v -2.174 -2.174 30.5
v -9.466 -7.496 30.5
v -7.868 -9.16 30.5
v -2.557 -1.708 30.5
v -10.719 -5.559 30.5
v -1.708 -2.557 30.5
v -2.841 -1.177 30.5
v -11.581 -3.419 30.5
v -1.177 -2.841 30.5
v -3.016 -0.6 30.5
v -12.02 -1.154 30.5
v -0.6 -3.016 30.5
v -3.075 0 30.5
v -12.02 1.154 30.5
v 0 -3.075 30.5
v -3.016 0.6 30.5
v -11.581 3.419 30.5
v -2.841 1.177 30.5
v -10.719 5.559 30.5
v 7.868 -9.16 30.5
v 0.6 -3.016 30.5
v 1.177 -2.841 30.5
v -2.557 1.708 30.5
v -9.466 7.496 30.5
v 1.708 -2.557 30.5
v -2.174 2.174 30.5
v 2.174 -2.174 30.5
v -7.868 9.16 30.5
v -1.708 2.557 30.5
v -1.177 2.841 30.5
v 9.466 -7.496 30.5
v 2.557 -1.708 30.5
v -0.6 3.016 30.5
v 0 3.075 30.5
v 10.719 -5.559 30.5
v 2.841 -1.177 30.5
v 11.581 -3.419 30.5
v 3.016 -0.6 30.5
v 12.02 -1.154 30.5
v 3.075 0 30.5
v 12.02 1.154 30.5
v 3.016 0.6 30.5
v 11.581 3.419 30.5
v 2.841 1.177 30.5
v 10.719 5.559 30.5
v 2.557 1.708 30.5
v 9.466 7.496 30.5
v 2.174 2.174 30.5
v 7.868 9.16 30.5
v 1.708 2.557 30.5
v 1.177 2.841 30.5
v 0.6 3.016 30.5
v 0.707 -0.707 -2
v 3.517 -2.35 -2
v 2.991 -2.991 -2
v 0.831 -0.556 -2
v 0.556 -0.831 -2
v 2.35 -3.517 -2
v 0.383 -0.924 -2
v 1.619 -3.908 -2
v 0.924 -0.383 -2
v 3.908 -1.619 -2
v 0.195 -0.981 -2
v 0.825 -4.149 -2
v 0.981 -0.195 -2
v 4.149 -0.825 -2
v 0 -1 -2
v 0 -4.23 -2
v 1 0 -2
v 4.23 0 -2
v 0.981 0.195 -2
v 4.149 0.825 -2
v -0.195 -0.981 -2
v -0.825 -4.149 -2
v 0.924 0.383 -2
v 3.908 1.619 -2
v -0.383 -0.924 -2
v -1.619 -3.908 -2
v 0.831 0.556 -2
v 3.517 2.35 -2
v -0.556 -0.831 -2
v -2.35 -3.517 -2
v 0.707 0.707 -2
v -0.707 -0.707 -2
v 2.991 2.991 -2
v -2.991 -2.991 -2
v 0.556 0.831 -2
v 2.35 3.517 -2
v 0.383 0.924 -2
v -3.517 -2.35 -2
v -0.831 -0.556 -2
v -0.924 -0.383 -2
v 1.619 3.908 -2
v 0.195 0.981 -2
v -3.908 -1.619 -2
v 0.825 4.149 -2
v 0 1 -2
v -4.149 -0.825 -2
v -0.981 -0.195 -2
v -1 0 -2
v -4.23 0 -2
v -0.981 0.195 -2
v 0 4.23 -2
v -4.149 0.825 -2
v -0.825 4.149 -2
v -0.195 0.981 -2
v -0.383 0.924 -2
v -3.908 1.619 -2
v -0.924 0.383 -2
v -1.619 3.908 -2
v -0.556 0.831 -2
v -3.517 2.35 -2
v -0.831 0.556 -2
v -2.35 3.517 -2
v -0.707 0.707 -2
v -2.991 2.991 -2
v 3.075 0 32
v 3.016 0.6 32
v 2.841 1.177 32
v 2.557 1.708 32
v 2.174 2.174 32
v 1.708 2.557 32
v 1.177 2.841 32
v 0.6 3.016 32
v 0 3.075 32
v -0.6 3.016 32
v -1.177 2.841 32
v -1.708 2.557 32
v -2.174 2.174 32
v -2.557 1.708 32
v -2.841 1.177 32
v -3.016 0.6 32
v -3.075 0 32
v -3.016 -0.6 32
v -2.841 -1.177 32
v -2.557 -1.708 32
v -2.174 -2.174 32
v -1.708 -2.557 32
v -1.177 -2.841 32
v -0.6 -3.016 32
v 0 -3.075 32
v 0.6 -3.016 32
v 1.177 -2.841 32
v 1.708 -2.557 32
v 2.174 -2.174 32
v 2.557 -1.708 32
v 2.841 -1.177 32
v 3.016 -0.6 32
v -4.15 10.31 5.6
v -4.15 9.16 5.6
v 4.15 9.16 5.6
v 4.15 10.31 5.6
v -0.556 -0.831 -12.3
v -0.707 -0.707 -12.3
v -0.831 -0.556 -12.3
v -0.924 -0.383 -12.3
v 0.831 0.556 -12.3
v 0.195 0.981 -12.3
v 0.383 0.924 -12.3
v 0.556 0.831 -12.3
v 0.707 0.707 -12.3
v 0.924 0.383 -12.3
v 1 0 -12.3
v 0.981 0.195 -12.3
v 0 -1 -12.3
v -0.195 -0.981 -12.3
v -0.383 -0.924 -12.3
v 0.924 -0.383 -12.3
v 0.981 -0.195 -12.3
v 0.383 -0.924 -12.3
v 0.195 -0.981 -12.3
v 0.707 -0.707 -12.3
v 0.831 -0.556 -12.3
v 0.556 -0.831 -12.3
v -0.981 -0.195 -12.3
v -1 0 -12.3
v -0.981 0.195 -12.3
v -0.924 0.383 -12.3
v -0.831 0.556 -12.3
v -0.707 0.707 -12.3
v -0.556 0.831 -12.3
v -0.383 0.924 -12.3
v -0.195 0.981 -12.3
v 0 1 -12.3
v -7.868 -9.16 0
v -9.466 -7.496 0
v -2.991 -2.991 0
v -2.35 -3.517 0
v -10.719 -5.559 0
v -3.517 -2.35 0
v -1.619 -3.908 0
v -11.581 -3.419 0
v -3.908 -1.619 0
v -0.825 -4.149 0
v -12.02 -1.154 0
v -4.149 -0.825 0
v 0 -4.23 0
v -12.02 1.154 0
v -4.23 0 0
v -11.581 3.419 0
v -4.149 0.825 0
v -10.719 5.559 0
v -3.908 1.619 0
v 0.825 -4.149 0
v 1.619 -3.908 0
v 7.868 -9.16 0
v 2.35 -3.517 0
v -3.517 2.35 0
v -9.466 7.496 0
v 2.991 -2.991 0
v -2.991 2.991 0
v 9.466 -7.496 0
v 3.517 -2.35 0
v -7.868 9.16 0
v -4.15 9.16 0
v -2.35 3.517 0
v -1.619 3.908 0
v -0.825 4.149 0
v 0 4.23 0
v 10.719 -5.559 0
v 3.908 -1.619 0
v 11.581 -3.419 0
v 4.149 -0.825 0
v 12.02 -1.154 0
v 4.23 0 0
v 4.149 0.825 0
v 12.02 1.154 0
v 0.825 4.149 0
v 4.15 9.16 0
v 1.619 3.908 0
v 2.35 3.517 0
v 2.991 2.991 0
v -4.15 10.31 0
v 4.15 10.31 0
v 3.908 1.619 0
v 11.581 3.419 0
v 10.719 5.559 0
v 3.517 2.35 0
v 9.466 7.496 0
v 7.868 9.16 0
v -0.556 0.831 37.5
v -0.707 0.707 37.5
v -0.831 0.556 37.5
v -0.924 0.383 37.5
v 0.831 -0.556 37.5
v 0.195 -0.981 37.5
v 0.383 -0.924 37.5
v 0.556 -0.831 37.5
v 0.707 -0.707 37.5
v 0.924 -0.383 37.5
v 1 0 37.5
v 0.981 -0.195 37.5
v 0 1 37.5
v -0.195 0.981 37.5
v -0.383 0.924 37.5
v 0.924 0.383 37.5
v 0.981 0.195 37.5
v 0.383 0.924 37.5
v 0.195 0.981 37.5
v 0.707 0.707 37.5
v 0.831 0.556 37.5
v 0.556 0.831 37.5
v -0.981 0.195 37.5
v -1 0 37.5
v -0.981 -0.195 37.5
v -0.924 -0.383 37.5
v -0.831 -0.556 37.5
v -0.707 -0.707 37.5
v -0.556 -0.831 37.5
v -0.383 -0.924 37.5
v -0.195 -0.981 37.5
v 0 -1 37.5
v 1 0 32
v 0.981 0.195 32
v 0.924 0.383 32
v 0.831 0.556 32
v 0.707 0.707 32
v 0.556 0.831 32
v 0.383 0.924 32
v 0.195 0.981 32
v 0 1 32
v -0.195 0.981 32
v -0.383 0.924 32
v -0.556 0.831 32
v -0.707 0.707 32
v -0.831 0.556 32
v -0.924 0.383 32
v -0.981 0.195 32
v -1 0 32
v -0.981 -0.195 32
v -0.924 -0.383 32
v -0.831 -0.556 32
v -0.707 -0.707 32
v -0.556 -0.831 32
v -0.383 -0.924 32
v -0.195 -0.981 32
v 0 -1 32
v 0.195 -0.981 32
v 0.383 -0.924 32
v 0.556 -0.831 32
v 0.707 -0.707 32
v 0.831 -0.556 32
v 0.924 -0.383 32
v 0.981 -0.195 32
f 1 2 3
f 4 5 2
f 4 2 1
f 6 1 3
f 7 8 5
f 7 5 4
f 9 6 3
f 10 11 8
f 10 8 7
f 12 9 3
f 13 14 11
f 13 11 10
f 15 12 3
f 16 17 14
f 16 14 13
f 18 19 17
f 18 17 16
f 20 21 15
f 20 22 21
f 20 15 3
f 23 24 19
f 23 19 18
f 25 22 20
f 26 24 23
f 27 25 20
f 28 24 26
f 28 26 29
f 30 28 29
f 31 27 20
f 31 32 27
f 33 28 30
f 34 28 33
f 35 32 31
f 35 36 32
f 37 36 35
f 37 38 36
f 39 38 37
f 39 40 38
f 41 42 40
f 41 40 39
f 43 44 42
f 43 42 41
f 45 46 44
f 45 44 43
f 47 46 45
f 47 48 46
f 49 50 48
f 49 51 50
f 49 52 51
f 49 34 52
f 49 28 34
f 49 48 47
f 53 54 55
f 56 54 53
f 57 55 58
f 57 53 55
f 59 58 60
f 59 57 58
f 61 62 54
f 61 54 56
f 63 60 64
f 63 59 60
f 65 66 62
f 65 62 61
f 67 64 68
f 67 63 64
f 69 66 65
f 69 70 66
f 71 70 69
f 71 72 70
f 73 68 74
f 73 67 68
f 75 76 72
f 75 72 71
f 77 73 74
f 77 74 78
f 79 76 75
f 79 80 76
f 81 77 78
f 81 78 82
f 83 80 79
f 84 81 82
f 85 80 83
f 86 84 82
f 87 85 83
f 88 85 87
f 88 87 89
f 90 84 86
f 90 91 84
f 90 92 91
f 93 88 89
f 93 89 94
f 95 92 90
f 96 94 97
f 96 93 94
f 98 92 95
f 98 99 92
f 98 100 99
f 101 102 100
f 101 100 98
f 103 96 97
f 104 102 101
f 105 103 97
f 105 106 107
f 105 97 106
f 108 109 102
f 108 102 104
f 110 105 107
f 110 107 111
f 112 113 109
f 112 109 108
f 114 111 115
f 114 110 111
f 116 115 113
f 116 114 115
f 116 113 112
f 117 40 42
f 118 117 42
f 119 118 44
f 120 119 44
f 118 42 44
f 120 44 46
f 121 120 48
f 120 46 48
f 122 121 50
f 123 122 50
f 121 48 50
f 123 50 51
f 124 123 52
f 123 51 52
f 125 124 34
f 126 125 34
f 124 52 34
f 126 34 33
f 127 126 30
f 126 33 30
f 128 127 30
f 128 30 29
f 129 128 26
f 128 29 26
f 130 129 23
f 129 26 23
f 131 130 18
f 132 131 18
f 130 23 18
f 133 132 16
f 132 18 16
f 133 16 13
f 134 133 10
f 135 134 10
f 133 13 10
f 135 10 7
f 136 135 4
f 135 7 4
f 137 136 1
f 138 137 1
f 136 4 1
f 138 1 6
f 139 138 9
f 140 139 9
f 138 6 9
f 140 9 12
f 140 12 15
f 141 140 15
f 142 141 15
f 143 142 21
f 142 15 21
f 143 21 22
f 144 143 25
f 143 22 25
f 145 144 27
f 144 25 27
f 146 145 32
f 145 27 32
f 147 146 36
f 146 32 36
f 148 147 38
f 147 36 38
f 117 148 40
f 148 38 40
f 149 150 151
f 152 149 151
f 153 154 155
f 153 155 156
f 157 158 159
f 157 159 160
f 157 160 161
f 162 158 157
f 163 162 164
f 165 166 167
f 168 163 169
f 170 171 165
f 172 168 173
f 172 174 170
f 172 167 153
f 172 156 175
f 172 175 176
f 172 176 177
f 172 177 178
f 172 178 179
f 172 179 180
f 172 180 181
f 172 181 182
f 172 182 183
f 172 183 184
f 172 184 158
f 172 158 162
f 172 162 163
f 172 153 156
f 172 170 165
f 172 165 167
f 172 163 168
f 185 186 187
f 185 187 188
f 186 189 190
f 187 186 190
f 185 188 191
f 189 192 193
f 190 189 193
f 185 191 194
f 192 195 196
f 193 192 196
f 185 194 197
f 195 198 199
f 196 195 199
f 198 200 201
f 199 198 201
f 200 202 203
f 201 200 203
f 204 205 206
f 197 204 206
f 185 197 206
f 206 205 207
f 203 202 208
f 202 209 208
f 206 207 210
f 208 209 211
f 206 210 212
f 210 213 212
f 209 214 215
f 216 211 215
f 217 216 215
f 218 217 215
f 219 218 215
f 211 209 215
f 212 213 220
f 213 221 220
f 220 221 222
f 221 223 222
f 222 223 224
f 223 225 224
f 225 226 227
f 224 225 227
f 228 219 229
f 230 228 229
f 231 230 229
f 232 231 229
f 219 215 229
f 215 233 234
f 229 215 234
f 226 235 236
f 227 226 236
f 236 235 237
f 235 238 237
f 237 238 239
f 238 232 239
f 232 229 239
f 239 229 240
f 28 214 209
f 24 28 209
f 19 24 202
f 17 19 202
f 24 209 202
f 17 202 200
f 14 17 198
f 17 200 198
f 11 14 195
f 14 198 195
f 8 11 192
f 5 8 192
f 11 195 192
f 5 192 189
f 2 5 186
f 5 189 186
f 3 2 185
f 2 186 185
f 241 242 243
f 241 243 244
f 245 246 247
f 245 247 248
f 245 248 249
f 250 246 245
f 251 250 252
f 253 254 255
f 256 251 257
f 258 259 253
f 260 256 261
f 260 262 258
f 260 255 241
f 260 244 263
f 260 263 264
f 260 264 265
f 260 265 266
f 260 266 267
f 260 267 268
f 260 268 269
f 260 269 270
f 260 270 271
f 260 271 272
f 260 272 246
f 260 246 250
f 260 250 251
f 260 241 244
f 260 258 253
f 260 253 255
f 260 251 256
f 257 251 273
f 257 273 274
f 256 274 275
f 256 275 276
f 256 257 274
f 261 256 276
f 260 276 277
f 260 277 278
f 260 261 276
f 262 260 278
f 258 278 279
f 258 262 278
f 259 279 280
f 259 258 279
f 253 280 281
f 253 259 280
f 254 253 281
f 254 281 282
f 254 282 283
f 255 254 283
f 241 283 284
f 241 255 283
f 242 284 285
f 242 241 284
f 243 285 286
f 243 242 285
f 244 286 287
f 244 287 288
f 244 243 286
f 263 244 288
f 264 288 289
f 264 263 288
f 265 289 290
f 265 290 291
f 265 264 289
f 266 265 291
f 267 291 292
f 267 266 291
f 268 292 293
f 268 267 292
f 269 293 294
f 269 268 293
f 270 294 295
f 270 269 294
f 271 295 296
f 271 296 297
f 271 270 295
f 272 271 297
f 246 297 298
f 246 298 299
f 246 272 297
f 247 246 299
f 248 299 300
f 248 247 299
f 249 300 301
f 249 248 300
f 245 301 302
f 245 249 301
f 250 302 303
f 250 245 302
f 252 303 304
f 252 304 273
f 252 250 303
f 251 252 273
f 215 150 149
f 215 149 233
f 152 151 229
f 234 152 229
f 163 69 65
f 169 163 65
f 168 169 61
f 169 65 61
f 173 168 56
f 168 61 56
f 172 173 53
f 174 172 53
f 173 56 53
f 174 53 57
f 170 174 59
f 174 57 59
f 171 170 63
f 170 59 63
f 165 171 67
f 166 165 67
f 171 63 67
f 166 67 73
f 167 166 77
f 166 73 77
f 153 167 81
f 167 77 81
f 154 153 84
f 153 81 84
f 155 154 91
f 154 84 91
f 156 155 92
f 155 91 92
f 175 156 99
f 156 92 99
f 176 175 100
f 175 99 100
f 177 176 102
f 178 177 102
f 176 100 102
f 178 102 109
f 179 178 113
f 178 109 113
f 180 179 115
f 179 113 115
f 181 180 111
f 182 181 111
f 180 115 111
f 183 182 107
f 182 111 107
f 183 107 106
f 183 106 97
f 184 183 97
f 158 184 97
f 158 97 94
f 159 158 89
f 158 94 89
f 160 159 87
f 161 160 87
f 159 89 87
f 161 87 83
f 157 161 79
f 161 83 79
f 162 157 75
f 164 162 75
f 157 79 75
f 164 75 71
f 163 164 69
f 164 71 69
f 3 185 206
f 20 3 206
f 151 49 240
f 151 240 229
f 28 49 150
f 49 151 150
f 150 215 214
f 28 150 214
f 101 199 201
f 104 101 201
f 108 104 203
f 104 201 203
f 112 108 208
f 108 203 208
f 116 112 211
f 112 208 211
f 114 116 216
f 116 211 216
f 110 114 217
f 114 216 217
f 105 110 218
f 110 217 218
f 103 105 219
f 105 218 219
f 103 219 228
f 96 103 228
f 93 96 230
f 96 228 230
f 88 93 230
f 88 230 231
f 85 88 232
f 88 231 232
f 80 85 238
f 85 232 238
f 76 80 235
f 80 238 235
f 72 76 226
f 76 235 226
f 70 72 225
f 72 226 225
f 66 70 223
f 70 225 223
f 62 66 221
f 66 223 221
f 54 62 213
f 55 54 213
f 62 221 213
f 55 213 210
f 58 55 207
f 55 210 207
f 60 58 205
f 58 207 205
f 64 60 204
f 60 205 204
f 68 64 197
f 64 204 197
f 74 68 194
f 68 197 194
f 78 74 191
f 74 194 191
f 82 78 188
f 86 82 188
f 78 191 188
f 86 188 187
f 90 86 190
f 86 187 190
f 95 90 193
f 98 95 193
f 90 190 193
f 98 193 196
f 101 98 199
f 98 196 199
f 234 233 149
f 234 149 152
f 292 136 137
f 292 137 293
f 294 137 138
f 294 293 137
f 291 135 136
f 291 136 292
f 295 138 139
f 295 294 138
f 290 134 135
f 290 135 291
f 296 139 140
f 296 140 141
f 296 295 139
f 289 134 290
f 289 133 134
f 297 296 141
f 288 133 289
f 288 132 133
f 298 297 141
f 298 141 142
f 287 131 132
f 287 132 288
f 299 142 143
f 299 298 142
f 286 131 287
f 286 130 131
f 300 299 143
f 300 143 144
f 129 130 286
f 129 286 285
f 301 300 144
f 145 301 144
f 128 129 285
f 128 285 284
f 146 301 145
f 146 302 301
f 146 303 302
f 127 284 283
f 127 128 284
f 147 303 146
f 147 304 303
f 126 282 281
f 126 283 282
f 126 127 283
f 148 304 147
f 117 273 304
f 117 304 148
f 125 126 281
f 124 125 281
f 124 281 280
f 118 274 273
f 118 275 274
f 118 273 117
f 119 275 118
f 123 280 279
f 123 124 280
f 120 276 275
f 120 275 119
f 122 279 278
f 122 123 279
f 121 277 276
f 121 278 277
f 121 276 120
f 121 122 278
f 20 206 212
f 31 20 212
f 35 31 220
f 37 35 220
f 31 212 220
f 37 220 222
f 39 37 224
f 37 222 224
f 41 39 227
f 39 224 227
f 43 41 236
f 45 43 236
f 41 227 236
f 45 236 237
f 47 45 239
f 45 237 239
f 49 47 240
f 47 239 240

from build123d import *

# Parameters (mm, degrees)
MAIN_BODY_DEPTH          = 30.5
SKETCH2_R                = 4.23
LONG_SHAFT_COLLAR_DEPTH  = 2
SKETCH3_R                = 1
LONG_SHAFT_DEPTH         = 10.3
SKETCH5_W                = 8.3
SKETCH5_H                = 5.6
LEAD_BUMP_DEPTH          = 1.15
SKETCH6_R                = 3.075
SHORT_SHAFT_COLLAR_DEPTH = 1.5
SHORT_START              = 5.5
SKETCH7_R                = 1
SHORT_SHAFT_DEPTH        = 5.5


with BuildPart() as part:
    # Sketch1 → Main Body (new body)
    with BuildSketch(Plane.XY):
        with BuildLine():
            Line((-7.867656894, -9.16), (7.867656894, -9.16))
            ThreePointArc((7.867656894, -9.16), (12.075, 0), (7.867656894, 9.16))
            Line((7.867656894, 9.16), (-7.867656894, 9.16))
            ThreePointArc((-7.867656894, 9.16), (-12.075, 0), (-7.867656894, -9.16))
        make_face()
    extrude(amount=MAIN_BODY_DEPTH)

    # Sketch2 → Long Shaft Collar (add)
    with BuildSketch(Plane(origin=(0, 0, 0), x_dir=(-1, 0, 0), z_dir=(0, 0, -1))):
        Circle(SKETCH2_R)
    extrude(amount=LONG_SHAFT_COLLAR_DEPTH)

    # Sketch3 → Long Shaft (add)
    with BuildSketch(Plane(origin=(0, 0, -2), x_dir=(-1, 0, 0), z_dir=(0, 0, -1))):
        with Locations(Location((0, 0, 0), (0, 0, 180))):
            Circle(SKETCH3_R)
    extrude(amount=LONG_SHAFT_DEPTH)

    # Sketch5 → Lead Bump (add)
    with BuildSketch(Plane(origin=(0, 9.16, 0), x_dir=(1, 0, 0), z_dir=(0, 1, 0))):
        with Locations((0, -2.8)):
            Rectangle(SKETCH5_W, SKETCH5_H)
    extrude(amount=LEAD_BUMP_DEPTH)

    # Sketch6 → Short Shaft Collar (add)
    with BuildSketch(Plane.XY.offset(30.5)):
        Circle(SKETCH6_R)
    extrude(amount=SHORT_SHAFT_COLLAR_DEPTH)

    # Sketch7 → Short shaft (add)
    with BuildSketch(Plane.XY.offset(32).offset(SHORT_START)):
        Circle(SKETCH7_R)
    extrude(amount=-SHORT_SHAFT_DEPTH)


solid = part.part
